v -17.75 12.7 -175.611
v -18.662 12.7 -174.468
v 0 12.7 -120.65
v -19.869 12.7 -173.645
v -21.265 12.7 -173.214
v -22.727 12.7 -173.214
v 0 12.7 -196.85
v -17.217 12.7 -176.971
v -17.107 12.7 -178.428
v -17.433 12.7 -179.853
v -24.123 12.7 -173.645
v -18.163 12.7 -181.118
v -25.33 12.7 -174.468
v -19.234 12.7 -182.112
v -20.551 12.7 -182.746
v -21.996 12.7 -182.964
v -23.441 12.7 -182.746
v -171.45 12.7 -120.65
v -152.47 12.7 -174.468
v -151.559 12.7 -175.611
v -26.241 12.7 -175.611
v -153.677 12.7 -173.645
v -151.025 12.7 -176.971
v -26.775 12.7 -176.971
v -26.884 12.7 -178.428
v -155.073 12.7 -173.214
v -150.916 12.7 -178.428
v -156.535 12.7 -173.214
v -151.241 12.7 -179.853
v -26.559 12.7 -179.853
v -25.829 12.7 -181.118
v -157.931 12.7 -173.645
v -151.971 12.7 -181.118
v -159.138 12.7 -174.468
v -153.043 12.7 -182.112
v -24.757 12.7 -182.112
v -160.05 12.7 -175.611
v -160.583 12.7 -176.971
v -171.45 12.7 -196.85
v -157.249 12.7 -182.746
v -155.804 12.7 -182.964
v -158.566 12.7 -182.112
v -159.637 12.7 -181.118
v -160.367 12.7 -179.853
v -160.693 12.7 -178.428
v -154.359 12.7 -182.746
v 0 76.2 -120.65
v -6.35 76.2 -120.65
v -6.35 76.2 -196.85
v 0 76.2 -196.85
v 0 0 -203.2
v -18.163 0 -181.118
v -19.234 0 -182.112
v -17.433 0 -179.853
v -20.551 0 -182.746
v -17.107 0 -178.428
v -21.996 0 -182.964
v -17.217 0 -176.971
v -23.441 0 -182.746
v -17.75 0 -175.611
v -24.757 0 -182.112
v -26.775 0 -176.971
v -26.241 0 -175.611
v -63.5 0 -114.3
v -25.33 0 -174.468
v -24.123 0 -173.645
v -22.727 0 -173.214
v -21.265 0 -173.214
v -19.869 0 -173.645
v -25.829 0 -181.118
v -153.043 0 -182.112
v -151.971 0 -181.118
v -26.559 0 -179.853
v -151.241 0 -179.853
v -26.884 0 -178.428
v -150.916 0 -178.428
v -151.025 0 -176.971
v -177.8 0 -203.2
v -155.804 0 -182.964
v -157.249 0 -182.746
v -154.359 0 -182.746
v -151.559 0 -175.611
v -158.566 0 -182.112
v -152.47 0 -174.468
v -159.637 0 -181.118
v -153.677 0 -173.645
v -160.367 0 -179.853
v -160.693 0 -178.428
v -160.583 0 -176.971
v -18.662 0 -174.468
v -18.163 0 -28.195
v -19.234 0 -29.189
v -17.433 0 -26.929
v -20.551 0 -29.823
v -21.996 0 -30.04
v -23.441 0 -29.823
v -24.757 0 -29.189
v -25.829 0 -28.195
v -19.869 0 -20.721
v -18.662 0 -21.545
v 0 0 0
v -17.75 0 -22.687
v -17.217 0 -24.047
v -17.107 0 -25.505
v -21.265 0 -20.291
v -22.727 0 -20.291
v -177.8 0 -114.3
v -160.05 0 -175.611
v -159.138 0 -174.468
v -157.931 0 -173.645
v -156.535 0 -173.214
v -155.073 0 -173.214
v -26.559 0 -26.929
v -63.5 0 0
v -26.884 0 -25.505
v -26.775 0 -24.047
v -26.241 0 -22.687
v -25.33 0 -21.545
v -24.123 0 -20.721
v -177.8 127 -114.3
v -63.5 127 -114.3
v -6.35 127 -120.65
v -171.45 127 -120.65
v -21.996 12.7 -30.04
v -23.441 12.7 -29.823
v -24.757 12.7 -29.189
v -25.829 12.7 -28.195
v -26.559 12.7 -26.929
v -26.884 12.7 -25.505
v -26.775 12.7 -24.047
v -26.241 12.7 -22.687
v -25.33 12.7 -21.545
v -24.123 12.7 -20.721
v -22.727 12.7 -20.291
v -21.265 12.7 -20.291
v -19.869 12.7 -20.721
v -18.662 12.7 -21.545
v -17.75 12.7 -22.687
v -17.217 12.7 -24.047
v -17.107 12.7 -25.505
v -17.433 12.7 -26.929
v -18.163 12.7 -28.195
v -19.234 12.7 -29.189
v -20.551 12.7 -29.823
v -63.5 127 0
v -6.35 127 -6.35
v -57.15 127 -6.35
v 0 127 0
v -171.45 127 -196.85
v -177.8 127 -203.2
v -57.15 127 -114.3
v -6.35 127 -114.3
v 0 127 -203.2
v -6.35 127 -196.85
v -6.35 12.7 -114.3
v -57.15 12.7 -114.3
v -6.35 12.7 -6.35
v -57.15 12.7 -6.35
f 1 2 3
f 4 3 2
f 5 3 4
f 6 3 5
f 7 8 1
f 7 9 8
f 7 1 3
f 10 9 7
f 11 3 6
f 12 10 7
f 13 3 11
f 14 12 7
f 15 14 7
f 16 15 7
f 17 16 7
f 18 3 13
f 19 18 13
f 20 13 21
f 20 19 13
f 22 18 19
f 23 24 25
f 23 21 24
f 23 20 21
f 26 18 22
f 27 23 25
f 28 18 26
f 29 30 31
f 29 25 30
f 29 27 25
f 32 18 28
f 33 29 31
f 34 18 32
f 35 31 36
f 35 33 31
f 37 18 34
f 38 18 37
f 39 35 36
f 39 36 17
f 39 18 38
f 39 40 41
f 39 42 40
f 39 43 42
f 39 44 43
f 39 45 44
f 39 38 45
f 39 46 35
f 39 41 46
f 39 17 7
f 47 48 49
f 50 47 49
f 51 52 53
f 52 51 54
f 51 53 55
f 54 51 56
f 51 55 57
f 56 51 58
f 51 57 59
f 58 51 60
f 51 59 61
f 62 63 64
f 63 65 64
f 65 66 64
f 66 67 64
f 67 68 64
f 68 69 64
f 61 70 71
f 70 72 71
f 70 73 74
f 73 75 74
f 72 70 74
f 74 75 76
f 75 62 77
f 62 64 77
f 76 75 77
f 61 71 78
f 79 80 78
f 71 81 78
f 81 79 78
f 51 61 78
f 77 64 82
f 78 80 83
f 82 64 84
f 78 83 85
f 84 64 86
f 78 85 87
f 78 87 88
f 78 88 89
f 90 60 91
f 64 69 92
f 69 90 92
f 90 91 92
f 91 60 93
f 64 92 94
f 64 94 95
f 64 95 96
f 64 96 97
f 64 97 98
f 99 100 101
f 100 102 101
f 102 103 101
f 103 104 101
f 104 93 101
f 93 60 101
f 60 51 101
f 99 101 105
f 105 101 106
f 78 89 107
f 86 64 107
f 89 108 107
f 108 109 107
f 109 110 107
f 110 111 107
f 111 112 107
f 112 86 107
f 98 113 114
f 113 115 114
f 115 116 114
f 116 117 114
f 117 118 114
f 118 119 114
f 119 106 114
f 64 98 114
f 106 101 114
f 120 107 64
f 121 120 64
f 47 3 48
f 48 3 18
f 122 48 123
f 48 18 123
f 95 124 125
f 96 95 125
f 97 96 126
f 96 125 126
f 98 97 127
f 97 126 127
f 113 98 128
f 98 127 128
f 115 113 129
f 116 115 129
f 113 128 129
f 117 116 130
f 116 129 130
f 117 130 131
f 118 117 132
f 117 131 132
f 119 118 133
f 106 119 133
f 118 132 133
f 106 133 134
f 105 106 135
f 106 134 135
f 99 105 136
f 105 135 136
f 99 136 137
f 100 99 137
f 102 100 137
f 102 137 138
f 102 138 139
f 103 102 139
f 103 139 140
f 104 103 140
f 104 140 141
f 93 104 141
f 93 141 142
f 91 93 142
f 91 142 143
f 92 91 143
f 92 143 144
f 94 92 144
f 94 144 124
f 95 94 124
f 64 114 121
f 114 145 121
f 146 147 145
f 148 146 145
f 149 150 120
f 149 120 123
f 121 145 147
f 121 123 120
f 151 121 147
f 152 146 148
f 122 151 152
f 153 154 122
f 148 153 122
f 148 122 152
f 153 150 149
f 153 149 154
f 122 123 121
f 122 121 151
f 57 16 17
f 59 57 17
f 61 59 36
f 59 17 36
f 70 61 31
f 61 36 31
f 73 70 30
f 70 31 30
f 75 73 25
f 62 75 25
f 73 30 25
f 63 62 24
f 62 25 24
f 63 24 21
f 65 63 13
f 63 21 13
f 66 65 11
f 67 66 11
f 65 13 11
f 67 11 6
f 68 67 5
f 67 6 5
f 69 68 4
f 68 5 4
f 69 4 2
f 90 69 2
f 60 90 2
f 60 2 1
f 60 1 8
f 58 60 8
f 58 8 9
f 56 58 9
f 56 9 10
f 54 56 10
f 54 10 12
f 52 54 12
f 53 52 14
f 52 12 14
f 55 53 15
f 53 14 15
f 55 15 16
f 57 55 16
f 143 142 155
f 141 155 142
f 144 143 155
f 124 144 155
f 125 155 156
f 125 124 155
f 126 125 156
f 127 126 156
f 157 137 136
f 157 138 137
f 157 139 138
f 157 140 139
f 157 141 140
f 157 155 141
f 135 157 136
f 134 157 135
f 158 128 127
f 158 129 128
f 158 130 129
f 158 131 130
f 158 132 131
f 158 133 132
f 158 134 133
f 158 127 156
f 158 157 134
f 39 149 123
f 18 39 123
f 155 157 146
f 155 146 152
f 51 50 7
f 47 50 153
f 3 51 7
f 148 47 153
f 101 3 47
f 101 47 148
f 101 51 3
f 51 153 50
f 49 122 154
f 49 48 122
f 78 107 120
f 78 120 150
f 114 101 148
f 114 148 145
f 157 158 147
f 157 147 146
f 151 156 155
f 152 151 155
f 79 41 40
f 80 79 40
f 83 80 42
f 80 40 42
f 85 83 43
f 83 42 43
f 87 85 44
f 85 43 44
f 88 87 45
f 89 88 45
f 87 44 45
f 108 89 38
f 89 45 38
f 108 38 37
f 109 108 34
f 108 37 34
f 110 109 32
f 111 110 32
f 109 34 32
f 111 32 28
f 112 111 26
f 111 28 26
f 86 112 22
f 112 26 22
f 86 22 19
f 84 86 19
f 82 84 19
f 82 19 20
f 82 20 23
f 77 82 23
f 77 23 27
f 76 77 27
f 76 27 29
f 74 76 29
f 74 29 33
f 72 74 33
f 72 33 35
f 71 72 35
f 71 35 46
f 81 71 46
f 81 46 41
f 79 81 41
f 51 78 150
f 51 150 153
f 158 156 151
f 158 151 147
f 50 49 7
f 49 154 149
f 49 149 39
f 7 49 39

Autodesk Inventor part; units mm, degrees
ref_plane "YZ Plane" through (0, 0, 0) normal (1, 0, 0) x (0, 1, 0)
ref_plane "XZ Plane" through (0, 0, 0) normal (0, 1, 0) x (-1, 0, 0)
ref_plane "XY Plane" through (0, 0, 0) normal (0, 0, 1) x (1, 0, 0)
sketch "Sketch2" plane through (0, 0, 0) normal (0, 1, 0) x (-1, 0, 0)
  line L0 (0, 0) -> (177.8, 0)
  line L1 (177.8, 0) -> (177.8, -203.2)
  line L2 (177.8, -203.2) -> (0, -203.2)
  line L3 (0, -203.2) -> (0, 0)
  dimension "d0" = 203.2
  dimension "d1" = 177.8
extrude "Extrusion1" add sketch "Sketch2" along normal blind 12.7
sketch "Sketch3" plane through (0, 12.7, 0) normal (0, 1, 0) x (1, 0, 0)
  line L0 (0, 0) -> (-177.8, 0)
  line L1 (-177.8, 0) -> (-177.8, 203.2)
  line L2 (-177.8, 203.2) -> (0, 203.2)
  line L3 (0, 203.2) -> (0, 0)
  line L4 (-171.45, 196.85) -> (-171.45, 6.35)
  line L5 (-171.45, 6.35) -> (-6.35, 6.35)
  line L6 (-6.35, 6.35) -> (-6.35, 196.85)
  line L7 (-6.35, 196.85) -> (-171.45, 196.85)
  dimension "d4" = 6.35
extrude "Extrusion2" add sketch "Sketch3" along normal blind 114.3
sketch "Sketch5" plane through (0, 12.7, 0) normal (0, 1, 0) x (1, 0, 0)
  line L0 (-63.5, 114.3) -> (-63.5, 6.35)
  line L1 (-6.35, 120.65) -> (-6.3512, 120.1928)
  line L2 (-171.45, 114.3) -> (-63.5, 114.3)
  line L3 (-171.45, 6.35) -> (-171.45, 196.85) projected
  line L4 (-6.35, 6.35) -> (-171.45, 6.35) projected
  line L5 (-171.45, 120.65) -> (-57.15, 120.65)
  line L6 (-57.15, 114.3) -> (-57.15, 6.35)
  line L7 (-171.45, 120.65) -> (-6.35, 120.65)
  line L8 (-57.15, 114.3) -> (-6.35, 114.3)
  line L9 (-6.35, 196.85) -> (-6.35, 6.35) projected
  line L10 (-171.45, 120.65) -> (-171.45, 114.3)
  line L11 (-6.35, 120.65) -> (-6.35, 114.3)
  line L12 (-6.35, 120.65) -> (-6.35, 114.3)
  line L13 (-63.5, 6.35) -> (-57.15, 6.35)
  line L14 (-171.45, 6.35) -> (-6.35, 6.35) projected
  dimension "d36" = 107.95
  dimension "d37" = 107.95
  dimension "d38" = 6.35
extrude "Extrusion5" add sketch "Sketch5" along normal blind 114.3 contours L2 L3 L5 L7 L1 L9 L8 L6 L4 L0
sketch "Sketch6" plane through (0, 0, 0) normal (0, -1, 0) x (1, 0, 0)
  line L0 (0, -203.2) -> (-177.8, 0) construction
  circle A0 centre (-88.9, -101.6) radius 101.6 construction
  line L1 (-177.8, -203.2) -> (0, 0) construction
  point P0 (-155.8041, -178.0618)
  point P1 (-155.8041, -25.1382)
  point P2 (-21.9959, -25.1382)
  point P3 (-21.9959, -178.0618)
  dimension "d25" = 203.2
hole "Hole1" at (-21.9959, 0, -25.1382) at (-155.8041, 0, -25.1382) at (-155.8041, 0, -178.0618) at (-21.9959, 0, -178.0618) direction (0, 1, 0) diameter 9.8044 end through all
sketch "Sketch7" plane through (-6.35, 12.7, -196.85) normal (-1, 0, 0) x (0, 0, 1)
  line L0 (76.2, 0) -> (0, 0) projected
  line L1 (76.2, 0) -> (76.2, 114.3) projected
  line L2 (0, 0) -> (76.2, 0)
  line L3 (76.2, 0) -> (76.2, 63.5)
  line L4 (76.2, 63.5) -> (0, 63.5)
  line L5 (0, 63.5) -> (0, 0)
  point P0 (196.85, -12.7)
  dimension "d39" = 63.5
extrude "Extrusion6" cut sketch "Sketch7" against normal blind 6.35
sketch "Sketch8" plane through (-177.8, 0, -203.2) normal (-1, 0, 0) x (0, 0, 1)
  line L0 (88.9, 12.7) -> (88.9, 127) projected
  line L1 (196.85, 127) -> (88.9, 127) projected
  line L2 (196.85, 12.7) -> (196.85, 127) projected
  line L3 (88.9, 12.7) -> (196.85, 12.7) projected
  point P0 (203.2, 0)
extrude "Extrusion7" cut sketch "Sketch8" against normal up to surface (114.3 mm away)
sketch "Sketch9" plane through (-177.8, 0, 0) normal (0, 0, 1) x (1, 0, 0)
  line L0 (0, 12.7) -> (114.3, 12.7) projected
  line L1 (114.3, 12.7) -> (114.3, 127) projected
  line L2 (0, 127) -> (114.3, 127) projected
  line L3 (0, 12.7) -> (0, 127) projected
  point P0 (177.8, 0)
extrude "Extrusion8" cut sketch "Sketch9" against normal up to surface (114.3 mm away)
sketch "Sketch10" plane through (0, 12.7, 0) normal (0, 1, 0) x (1, 0, 0)
  circle A0 centre (-155.8041, 25.1382) radius 4.9022 projected
  line L0 (-177.8, 114.3) -> (-63.5, 114.3) projected
  line L1 (-177.8, 0) -> (-177.8, 114.3) projected
  line L2 (-63.5, 0) -> (-177.8, 0) projected
  line L3 (-63.5, 0) -> (-63.5, 114.3) projected
  line L4 (-177.8, 0) -> (-177.8, 114.3) projected
  line L5 (-6.35, 114.3) -> (-6.35, 6.35) projected
  line L6 (-6.35, 6.35) -> (-57.15, 6.35) projected
  line L7 (-57.15, 6.35) -> (-57.15, 114.3) projected
  line L8 (-57.15, 114.3) -> (-6.35, 114.3) projected
  line L9 (-171.45, 120.65) -> (-171.45, 196.85) projected
  line L10 (-171.45, 196.85) -> (-6.35, 196.85) projected
  line L11 (-6.35, 196.85) -> (-6.35, 120.65) projected
  line L12 (-6.35, 120.65) -> (-171.45, 120.65) projected
  line L13 (-63.5, 114.3) -> (-63.5, 0) projected
  line L14 (-63.5, 0) -> (0, 0) projected
  line L15 (0, 0) -> (0, 203.2) projected
  line L16 (0, 203.2) -> (-177.8, 203.2) projected
  line L17 (-177.8, 203.2) -> (-177.8, 114.3) projected
  line L18 (-177.8, 114.3) -> (-63.5, 114.3) projected
  point P0 (-177.8, 66.675)
extrude "Extrusion10" cut sketch "Sketch10" against normal through all contours L0 L3 L2 L1
properties part number "RSX Structure" material "Aluminum 6061"
